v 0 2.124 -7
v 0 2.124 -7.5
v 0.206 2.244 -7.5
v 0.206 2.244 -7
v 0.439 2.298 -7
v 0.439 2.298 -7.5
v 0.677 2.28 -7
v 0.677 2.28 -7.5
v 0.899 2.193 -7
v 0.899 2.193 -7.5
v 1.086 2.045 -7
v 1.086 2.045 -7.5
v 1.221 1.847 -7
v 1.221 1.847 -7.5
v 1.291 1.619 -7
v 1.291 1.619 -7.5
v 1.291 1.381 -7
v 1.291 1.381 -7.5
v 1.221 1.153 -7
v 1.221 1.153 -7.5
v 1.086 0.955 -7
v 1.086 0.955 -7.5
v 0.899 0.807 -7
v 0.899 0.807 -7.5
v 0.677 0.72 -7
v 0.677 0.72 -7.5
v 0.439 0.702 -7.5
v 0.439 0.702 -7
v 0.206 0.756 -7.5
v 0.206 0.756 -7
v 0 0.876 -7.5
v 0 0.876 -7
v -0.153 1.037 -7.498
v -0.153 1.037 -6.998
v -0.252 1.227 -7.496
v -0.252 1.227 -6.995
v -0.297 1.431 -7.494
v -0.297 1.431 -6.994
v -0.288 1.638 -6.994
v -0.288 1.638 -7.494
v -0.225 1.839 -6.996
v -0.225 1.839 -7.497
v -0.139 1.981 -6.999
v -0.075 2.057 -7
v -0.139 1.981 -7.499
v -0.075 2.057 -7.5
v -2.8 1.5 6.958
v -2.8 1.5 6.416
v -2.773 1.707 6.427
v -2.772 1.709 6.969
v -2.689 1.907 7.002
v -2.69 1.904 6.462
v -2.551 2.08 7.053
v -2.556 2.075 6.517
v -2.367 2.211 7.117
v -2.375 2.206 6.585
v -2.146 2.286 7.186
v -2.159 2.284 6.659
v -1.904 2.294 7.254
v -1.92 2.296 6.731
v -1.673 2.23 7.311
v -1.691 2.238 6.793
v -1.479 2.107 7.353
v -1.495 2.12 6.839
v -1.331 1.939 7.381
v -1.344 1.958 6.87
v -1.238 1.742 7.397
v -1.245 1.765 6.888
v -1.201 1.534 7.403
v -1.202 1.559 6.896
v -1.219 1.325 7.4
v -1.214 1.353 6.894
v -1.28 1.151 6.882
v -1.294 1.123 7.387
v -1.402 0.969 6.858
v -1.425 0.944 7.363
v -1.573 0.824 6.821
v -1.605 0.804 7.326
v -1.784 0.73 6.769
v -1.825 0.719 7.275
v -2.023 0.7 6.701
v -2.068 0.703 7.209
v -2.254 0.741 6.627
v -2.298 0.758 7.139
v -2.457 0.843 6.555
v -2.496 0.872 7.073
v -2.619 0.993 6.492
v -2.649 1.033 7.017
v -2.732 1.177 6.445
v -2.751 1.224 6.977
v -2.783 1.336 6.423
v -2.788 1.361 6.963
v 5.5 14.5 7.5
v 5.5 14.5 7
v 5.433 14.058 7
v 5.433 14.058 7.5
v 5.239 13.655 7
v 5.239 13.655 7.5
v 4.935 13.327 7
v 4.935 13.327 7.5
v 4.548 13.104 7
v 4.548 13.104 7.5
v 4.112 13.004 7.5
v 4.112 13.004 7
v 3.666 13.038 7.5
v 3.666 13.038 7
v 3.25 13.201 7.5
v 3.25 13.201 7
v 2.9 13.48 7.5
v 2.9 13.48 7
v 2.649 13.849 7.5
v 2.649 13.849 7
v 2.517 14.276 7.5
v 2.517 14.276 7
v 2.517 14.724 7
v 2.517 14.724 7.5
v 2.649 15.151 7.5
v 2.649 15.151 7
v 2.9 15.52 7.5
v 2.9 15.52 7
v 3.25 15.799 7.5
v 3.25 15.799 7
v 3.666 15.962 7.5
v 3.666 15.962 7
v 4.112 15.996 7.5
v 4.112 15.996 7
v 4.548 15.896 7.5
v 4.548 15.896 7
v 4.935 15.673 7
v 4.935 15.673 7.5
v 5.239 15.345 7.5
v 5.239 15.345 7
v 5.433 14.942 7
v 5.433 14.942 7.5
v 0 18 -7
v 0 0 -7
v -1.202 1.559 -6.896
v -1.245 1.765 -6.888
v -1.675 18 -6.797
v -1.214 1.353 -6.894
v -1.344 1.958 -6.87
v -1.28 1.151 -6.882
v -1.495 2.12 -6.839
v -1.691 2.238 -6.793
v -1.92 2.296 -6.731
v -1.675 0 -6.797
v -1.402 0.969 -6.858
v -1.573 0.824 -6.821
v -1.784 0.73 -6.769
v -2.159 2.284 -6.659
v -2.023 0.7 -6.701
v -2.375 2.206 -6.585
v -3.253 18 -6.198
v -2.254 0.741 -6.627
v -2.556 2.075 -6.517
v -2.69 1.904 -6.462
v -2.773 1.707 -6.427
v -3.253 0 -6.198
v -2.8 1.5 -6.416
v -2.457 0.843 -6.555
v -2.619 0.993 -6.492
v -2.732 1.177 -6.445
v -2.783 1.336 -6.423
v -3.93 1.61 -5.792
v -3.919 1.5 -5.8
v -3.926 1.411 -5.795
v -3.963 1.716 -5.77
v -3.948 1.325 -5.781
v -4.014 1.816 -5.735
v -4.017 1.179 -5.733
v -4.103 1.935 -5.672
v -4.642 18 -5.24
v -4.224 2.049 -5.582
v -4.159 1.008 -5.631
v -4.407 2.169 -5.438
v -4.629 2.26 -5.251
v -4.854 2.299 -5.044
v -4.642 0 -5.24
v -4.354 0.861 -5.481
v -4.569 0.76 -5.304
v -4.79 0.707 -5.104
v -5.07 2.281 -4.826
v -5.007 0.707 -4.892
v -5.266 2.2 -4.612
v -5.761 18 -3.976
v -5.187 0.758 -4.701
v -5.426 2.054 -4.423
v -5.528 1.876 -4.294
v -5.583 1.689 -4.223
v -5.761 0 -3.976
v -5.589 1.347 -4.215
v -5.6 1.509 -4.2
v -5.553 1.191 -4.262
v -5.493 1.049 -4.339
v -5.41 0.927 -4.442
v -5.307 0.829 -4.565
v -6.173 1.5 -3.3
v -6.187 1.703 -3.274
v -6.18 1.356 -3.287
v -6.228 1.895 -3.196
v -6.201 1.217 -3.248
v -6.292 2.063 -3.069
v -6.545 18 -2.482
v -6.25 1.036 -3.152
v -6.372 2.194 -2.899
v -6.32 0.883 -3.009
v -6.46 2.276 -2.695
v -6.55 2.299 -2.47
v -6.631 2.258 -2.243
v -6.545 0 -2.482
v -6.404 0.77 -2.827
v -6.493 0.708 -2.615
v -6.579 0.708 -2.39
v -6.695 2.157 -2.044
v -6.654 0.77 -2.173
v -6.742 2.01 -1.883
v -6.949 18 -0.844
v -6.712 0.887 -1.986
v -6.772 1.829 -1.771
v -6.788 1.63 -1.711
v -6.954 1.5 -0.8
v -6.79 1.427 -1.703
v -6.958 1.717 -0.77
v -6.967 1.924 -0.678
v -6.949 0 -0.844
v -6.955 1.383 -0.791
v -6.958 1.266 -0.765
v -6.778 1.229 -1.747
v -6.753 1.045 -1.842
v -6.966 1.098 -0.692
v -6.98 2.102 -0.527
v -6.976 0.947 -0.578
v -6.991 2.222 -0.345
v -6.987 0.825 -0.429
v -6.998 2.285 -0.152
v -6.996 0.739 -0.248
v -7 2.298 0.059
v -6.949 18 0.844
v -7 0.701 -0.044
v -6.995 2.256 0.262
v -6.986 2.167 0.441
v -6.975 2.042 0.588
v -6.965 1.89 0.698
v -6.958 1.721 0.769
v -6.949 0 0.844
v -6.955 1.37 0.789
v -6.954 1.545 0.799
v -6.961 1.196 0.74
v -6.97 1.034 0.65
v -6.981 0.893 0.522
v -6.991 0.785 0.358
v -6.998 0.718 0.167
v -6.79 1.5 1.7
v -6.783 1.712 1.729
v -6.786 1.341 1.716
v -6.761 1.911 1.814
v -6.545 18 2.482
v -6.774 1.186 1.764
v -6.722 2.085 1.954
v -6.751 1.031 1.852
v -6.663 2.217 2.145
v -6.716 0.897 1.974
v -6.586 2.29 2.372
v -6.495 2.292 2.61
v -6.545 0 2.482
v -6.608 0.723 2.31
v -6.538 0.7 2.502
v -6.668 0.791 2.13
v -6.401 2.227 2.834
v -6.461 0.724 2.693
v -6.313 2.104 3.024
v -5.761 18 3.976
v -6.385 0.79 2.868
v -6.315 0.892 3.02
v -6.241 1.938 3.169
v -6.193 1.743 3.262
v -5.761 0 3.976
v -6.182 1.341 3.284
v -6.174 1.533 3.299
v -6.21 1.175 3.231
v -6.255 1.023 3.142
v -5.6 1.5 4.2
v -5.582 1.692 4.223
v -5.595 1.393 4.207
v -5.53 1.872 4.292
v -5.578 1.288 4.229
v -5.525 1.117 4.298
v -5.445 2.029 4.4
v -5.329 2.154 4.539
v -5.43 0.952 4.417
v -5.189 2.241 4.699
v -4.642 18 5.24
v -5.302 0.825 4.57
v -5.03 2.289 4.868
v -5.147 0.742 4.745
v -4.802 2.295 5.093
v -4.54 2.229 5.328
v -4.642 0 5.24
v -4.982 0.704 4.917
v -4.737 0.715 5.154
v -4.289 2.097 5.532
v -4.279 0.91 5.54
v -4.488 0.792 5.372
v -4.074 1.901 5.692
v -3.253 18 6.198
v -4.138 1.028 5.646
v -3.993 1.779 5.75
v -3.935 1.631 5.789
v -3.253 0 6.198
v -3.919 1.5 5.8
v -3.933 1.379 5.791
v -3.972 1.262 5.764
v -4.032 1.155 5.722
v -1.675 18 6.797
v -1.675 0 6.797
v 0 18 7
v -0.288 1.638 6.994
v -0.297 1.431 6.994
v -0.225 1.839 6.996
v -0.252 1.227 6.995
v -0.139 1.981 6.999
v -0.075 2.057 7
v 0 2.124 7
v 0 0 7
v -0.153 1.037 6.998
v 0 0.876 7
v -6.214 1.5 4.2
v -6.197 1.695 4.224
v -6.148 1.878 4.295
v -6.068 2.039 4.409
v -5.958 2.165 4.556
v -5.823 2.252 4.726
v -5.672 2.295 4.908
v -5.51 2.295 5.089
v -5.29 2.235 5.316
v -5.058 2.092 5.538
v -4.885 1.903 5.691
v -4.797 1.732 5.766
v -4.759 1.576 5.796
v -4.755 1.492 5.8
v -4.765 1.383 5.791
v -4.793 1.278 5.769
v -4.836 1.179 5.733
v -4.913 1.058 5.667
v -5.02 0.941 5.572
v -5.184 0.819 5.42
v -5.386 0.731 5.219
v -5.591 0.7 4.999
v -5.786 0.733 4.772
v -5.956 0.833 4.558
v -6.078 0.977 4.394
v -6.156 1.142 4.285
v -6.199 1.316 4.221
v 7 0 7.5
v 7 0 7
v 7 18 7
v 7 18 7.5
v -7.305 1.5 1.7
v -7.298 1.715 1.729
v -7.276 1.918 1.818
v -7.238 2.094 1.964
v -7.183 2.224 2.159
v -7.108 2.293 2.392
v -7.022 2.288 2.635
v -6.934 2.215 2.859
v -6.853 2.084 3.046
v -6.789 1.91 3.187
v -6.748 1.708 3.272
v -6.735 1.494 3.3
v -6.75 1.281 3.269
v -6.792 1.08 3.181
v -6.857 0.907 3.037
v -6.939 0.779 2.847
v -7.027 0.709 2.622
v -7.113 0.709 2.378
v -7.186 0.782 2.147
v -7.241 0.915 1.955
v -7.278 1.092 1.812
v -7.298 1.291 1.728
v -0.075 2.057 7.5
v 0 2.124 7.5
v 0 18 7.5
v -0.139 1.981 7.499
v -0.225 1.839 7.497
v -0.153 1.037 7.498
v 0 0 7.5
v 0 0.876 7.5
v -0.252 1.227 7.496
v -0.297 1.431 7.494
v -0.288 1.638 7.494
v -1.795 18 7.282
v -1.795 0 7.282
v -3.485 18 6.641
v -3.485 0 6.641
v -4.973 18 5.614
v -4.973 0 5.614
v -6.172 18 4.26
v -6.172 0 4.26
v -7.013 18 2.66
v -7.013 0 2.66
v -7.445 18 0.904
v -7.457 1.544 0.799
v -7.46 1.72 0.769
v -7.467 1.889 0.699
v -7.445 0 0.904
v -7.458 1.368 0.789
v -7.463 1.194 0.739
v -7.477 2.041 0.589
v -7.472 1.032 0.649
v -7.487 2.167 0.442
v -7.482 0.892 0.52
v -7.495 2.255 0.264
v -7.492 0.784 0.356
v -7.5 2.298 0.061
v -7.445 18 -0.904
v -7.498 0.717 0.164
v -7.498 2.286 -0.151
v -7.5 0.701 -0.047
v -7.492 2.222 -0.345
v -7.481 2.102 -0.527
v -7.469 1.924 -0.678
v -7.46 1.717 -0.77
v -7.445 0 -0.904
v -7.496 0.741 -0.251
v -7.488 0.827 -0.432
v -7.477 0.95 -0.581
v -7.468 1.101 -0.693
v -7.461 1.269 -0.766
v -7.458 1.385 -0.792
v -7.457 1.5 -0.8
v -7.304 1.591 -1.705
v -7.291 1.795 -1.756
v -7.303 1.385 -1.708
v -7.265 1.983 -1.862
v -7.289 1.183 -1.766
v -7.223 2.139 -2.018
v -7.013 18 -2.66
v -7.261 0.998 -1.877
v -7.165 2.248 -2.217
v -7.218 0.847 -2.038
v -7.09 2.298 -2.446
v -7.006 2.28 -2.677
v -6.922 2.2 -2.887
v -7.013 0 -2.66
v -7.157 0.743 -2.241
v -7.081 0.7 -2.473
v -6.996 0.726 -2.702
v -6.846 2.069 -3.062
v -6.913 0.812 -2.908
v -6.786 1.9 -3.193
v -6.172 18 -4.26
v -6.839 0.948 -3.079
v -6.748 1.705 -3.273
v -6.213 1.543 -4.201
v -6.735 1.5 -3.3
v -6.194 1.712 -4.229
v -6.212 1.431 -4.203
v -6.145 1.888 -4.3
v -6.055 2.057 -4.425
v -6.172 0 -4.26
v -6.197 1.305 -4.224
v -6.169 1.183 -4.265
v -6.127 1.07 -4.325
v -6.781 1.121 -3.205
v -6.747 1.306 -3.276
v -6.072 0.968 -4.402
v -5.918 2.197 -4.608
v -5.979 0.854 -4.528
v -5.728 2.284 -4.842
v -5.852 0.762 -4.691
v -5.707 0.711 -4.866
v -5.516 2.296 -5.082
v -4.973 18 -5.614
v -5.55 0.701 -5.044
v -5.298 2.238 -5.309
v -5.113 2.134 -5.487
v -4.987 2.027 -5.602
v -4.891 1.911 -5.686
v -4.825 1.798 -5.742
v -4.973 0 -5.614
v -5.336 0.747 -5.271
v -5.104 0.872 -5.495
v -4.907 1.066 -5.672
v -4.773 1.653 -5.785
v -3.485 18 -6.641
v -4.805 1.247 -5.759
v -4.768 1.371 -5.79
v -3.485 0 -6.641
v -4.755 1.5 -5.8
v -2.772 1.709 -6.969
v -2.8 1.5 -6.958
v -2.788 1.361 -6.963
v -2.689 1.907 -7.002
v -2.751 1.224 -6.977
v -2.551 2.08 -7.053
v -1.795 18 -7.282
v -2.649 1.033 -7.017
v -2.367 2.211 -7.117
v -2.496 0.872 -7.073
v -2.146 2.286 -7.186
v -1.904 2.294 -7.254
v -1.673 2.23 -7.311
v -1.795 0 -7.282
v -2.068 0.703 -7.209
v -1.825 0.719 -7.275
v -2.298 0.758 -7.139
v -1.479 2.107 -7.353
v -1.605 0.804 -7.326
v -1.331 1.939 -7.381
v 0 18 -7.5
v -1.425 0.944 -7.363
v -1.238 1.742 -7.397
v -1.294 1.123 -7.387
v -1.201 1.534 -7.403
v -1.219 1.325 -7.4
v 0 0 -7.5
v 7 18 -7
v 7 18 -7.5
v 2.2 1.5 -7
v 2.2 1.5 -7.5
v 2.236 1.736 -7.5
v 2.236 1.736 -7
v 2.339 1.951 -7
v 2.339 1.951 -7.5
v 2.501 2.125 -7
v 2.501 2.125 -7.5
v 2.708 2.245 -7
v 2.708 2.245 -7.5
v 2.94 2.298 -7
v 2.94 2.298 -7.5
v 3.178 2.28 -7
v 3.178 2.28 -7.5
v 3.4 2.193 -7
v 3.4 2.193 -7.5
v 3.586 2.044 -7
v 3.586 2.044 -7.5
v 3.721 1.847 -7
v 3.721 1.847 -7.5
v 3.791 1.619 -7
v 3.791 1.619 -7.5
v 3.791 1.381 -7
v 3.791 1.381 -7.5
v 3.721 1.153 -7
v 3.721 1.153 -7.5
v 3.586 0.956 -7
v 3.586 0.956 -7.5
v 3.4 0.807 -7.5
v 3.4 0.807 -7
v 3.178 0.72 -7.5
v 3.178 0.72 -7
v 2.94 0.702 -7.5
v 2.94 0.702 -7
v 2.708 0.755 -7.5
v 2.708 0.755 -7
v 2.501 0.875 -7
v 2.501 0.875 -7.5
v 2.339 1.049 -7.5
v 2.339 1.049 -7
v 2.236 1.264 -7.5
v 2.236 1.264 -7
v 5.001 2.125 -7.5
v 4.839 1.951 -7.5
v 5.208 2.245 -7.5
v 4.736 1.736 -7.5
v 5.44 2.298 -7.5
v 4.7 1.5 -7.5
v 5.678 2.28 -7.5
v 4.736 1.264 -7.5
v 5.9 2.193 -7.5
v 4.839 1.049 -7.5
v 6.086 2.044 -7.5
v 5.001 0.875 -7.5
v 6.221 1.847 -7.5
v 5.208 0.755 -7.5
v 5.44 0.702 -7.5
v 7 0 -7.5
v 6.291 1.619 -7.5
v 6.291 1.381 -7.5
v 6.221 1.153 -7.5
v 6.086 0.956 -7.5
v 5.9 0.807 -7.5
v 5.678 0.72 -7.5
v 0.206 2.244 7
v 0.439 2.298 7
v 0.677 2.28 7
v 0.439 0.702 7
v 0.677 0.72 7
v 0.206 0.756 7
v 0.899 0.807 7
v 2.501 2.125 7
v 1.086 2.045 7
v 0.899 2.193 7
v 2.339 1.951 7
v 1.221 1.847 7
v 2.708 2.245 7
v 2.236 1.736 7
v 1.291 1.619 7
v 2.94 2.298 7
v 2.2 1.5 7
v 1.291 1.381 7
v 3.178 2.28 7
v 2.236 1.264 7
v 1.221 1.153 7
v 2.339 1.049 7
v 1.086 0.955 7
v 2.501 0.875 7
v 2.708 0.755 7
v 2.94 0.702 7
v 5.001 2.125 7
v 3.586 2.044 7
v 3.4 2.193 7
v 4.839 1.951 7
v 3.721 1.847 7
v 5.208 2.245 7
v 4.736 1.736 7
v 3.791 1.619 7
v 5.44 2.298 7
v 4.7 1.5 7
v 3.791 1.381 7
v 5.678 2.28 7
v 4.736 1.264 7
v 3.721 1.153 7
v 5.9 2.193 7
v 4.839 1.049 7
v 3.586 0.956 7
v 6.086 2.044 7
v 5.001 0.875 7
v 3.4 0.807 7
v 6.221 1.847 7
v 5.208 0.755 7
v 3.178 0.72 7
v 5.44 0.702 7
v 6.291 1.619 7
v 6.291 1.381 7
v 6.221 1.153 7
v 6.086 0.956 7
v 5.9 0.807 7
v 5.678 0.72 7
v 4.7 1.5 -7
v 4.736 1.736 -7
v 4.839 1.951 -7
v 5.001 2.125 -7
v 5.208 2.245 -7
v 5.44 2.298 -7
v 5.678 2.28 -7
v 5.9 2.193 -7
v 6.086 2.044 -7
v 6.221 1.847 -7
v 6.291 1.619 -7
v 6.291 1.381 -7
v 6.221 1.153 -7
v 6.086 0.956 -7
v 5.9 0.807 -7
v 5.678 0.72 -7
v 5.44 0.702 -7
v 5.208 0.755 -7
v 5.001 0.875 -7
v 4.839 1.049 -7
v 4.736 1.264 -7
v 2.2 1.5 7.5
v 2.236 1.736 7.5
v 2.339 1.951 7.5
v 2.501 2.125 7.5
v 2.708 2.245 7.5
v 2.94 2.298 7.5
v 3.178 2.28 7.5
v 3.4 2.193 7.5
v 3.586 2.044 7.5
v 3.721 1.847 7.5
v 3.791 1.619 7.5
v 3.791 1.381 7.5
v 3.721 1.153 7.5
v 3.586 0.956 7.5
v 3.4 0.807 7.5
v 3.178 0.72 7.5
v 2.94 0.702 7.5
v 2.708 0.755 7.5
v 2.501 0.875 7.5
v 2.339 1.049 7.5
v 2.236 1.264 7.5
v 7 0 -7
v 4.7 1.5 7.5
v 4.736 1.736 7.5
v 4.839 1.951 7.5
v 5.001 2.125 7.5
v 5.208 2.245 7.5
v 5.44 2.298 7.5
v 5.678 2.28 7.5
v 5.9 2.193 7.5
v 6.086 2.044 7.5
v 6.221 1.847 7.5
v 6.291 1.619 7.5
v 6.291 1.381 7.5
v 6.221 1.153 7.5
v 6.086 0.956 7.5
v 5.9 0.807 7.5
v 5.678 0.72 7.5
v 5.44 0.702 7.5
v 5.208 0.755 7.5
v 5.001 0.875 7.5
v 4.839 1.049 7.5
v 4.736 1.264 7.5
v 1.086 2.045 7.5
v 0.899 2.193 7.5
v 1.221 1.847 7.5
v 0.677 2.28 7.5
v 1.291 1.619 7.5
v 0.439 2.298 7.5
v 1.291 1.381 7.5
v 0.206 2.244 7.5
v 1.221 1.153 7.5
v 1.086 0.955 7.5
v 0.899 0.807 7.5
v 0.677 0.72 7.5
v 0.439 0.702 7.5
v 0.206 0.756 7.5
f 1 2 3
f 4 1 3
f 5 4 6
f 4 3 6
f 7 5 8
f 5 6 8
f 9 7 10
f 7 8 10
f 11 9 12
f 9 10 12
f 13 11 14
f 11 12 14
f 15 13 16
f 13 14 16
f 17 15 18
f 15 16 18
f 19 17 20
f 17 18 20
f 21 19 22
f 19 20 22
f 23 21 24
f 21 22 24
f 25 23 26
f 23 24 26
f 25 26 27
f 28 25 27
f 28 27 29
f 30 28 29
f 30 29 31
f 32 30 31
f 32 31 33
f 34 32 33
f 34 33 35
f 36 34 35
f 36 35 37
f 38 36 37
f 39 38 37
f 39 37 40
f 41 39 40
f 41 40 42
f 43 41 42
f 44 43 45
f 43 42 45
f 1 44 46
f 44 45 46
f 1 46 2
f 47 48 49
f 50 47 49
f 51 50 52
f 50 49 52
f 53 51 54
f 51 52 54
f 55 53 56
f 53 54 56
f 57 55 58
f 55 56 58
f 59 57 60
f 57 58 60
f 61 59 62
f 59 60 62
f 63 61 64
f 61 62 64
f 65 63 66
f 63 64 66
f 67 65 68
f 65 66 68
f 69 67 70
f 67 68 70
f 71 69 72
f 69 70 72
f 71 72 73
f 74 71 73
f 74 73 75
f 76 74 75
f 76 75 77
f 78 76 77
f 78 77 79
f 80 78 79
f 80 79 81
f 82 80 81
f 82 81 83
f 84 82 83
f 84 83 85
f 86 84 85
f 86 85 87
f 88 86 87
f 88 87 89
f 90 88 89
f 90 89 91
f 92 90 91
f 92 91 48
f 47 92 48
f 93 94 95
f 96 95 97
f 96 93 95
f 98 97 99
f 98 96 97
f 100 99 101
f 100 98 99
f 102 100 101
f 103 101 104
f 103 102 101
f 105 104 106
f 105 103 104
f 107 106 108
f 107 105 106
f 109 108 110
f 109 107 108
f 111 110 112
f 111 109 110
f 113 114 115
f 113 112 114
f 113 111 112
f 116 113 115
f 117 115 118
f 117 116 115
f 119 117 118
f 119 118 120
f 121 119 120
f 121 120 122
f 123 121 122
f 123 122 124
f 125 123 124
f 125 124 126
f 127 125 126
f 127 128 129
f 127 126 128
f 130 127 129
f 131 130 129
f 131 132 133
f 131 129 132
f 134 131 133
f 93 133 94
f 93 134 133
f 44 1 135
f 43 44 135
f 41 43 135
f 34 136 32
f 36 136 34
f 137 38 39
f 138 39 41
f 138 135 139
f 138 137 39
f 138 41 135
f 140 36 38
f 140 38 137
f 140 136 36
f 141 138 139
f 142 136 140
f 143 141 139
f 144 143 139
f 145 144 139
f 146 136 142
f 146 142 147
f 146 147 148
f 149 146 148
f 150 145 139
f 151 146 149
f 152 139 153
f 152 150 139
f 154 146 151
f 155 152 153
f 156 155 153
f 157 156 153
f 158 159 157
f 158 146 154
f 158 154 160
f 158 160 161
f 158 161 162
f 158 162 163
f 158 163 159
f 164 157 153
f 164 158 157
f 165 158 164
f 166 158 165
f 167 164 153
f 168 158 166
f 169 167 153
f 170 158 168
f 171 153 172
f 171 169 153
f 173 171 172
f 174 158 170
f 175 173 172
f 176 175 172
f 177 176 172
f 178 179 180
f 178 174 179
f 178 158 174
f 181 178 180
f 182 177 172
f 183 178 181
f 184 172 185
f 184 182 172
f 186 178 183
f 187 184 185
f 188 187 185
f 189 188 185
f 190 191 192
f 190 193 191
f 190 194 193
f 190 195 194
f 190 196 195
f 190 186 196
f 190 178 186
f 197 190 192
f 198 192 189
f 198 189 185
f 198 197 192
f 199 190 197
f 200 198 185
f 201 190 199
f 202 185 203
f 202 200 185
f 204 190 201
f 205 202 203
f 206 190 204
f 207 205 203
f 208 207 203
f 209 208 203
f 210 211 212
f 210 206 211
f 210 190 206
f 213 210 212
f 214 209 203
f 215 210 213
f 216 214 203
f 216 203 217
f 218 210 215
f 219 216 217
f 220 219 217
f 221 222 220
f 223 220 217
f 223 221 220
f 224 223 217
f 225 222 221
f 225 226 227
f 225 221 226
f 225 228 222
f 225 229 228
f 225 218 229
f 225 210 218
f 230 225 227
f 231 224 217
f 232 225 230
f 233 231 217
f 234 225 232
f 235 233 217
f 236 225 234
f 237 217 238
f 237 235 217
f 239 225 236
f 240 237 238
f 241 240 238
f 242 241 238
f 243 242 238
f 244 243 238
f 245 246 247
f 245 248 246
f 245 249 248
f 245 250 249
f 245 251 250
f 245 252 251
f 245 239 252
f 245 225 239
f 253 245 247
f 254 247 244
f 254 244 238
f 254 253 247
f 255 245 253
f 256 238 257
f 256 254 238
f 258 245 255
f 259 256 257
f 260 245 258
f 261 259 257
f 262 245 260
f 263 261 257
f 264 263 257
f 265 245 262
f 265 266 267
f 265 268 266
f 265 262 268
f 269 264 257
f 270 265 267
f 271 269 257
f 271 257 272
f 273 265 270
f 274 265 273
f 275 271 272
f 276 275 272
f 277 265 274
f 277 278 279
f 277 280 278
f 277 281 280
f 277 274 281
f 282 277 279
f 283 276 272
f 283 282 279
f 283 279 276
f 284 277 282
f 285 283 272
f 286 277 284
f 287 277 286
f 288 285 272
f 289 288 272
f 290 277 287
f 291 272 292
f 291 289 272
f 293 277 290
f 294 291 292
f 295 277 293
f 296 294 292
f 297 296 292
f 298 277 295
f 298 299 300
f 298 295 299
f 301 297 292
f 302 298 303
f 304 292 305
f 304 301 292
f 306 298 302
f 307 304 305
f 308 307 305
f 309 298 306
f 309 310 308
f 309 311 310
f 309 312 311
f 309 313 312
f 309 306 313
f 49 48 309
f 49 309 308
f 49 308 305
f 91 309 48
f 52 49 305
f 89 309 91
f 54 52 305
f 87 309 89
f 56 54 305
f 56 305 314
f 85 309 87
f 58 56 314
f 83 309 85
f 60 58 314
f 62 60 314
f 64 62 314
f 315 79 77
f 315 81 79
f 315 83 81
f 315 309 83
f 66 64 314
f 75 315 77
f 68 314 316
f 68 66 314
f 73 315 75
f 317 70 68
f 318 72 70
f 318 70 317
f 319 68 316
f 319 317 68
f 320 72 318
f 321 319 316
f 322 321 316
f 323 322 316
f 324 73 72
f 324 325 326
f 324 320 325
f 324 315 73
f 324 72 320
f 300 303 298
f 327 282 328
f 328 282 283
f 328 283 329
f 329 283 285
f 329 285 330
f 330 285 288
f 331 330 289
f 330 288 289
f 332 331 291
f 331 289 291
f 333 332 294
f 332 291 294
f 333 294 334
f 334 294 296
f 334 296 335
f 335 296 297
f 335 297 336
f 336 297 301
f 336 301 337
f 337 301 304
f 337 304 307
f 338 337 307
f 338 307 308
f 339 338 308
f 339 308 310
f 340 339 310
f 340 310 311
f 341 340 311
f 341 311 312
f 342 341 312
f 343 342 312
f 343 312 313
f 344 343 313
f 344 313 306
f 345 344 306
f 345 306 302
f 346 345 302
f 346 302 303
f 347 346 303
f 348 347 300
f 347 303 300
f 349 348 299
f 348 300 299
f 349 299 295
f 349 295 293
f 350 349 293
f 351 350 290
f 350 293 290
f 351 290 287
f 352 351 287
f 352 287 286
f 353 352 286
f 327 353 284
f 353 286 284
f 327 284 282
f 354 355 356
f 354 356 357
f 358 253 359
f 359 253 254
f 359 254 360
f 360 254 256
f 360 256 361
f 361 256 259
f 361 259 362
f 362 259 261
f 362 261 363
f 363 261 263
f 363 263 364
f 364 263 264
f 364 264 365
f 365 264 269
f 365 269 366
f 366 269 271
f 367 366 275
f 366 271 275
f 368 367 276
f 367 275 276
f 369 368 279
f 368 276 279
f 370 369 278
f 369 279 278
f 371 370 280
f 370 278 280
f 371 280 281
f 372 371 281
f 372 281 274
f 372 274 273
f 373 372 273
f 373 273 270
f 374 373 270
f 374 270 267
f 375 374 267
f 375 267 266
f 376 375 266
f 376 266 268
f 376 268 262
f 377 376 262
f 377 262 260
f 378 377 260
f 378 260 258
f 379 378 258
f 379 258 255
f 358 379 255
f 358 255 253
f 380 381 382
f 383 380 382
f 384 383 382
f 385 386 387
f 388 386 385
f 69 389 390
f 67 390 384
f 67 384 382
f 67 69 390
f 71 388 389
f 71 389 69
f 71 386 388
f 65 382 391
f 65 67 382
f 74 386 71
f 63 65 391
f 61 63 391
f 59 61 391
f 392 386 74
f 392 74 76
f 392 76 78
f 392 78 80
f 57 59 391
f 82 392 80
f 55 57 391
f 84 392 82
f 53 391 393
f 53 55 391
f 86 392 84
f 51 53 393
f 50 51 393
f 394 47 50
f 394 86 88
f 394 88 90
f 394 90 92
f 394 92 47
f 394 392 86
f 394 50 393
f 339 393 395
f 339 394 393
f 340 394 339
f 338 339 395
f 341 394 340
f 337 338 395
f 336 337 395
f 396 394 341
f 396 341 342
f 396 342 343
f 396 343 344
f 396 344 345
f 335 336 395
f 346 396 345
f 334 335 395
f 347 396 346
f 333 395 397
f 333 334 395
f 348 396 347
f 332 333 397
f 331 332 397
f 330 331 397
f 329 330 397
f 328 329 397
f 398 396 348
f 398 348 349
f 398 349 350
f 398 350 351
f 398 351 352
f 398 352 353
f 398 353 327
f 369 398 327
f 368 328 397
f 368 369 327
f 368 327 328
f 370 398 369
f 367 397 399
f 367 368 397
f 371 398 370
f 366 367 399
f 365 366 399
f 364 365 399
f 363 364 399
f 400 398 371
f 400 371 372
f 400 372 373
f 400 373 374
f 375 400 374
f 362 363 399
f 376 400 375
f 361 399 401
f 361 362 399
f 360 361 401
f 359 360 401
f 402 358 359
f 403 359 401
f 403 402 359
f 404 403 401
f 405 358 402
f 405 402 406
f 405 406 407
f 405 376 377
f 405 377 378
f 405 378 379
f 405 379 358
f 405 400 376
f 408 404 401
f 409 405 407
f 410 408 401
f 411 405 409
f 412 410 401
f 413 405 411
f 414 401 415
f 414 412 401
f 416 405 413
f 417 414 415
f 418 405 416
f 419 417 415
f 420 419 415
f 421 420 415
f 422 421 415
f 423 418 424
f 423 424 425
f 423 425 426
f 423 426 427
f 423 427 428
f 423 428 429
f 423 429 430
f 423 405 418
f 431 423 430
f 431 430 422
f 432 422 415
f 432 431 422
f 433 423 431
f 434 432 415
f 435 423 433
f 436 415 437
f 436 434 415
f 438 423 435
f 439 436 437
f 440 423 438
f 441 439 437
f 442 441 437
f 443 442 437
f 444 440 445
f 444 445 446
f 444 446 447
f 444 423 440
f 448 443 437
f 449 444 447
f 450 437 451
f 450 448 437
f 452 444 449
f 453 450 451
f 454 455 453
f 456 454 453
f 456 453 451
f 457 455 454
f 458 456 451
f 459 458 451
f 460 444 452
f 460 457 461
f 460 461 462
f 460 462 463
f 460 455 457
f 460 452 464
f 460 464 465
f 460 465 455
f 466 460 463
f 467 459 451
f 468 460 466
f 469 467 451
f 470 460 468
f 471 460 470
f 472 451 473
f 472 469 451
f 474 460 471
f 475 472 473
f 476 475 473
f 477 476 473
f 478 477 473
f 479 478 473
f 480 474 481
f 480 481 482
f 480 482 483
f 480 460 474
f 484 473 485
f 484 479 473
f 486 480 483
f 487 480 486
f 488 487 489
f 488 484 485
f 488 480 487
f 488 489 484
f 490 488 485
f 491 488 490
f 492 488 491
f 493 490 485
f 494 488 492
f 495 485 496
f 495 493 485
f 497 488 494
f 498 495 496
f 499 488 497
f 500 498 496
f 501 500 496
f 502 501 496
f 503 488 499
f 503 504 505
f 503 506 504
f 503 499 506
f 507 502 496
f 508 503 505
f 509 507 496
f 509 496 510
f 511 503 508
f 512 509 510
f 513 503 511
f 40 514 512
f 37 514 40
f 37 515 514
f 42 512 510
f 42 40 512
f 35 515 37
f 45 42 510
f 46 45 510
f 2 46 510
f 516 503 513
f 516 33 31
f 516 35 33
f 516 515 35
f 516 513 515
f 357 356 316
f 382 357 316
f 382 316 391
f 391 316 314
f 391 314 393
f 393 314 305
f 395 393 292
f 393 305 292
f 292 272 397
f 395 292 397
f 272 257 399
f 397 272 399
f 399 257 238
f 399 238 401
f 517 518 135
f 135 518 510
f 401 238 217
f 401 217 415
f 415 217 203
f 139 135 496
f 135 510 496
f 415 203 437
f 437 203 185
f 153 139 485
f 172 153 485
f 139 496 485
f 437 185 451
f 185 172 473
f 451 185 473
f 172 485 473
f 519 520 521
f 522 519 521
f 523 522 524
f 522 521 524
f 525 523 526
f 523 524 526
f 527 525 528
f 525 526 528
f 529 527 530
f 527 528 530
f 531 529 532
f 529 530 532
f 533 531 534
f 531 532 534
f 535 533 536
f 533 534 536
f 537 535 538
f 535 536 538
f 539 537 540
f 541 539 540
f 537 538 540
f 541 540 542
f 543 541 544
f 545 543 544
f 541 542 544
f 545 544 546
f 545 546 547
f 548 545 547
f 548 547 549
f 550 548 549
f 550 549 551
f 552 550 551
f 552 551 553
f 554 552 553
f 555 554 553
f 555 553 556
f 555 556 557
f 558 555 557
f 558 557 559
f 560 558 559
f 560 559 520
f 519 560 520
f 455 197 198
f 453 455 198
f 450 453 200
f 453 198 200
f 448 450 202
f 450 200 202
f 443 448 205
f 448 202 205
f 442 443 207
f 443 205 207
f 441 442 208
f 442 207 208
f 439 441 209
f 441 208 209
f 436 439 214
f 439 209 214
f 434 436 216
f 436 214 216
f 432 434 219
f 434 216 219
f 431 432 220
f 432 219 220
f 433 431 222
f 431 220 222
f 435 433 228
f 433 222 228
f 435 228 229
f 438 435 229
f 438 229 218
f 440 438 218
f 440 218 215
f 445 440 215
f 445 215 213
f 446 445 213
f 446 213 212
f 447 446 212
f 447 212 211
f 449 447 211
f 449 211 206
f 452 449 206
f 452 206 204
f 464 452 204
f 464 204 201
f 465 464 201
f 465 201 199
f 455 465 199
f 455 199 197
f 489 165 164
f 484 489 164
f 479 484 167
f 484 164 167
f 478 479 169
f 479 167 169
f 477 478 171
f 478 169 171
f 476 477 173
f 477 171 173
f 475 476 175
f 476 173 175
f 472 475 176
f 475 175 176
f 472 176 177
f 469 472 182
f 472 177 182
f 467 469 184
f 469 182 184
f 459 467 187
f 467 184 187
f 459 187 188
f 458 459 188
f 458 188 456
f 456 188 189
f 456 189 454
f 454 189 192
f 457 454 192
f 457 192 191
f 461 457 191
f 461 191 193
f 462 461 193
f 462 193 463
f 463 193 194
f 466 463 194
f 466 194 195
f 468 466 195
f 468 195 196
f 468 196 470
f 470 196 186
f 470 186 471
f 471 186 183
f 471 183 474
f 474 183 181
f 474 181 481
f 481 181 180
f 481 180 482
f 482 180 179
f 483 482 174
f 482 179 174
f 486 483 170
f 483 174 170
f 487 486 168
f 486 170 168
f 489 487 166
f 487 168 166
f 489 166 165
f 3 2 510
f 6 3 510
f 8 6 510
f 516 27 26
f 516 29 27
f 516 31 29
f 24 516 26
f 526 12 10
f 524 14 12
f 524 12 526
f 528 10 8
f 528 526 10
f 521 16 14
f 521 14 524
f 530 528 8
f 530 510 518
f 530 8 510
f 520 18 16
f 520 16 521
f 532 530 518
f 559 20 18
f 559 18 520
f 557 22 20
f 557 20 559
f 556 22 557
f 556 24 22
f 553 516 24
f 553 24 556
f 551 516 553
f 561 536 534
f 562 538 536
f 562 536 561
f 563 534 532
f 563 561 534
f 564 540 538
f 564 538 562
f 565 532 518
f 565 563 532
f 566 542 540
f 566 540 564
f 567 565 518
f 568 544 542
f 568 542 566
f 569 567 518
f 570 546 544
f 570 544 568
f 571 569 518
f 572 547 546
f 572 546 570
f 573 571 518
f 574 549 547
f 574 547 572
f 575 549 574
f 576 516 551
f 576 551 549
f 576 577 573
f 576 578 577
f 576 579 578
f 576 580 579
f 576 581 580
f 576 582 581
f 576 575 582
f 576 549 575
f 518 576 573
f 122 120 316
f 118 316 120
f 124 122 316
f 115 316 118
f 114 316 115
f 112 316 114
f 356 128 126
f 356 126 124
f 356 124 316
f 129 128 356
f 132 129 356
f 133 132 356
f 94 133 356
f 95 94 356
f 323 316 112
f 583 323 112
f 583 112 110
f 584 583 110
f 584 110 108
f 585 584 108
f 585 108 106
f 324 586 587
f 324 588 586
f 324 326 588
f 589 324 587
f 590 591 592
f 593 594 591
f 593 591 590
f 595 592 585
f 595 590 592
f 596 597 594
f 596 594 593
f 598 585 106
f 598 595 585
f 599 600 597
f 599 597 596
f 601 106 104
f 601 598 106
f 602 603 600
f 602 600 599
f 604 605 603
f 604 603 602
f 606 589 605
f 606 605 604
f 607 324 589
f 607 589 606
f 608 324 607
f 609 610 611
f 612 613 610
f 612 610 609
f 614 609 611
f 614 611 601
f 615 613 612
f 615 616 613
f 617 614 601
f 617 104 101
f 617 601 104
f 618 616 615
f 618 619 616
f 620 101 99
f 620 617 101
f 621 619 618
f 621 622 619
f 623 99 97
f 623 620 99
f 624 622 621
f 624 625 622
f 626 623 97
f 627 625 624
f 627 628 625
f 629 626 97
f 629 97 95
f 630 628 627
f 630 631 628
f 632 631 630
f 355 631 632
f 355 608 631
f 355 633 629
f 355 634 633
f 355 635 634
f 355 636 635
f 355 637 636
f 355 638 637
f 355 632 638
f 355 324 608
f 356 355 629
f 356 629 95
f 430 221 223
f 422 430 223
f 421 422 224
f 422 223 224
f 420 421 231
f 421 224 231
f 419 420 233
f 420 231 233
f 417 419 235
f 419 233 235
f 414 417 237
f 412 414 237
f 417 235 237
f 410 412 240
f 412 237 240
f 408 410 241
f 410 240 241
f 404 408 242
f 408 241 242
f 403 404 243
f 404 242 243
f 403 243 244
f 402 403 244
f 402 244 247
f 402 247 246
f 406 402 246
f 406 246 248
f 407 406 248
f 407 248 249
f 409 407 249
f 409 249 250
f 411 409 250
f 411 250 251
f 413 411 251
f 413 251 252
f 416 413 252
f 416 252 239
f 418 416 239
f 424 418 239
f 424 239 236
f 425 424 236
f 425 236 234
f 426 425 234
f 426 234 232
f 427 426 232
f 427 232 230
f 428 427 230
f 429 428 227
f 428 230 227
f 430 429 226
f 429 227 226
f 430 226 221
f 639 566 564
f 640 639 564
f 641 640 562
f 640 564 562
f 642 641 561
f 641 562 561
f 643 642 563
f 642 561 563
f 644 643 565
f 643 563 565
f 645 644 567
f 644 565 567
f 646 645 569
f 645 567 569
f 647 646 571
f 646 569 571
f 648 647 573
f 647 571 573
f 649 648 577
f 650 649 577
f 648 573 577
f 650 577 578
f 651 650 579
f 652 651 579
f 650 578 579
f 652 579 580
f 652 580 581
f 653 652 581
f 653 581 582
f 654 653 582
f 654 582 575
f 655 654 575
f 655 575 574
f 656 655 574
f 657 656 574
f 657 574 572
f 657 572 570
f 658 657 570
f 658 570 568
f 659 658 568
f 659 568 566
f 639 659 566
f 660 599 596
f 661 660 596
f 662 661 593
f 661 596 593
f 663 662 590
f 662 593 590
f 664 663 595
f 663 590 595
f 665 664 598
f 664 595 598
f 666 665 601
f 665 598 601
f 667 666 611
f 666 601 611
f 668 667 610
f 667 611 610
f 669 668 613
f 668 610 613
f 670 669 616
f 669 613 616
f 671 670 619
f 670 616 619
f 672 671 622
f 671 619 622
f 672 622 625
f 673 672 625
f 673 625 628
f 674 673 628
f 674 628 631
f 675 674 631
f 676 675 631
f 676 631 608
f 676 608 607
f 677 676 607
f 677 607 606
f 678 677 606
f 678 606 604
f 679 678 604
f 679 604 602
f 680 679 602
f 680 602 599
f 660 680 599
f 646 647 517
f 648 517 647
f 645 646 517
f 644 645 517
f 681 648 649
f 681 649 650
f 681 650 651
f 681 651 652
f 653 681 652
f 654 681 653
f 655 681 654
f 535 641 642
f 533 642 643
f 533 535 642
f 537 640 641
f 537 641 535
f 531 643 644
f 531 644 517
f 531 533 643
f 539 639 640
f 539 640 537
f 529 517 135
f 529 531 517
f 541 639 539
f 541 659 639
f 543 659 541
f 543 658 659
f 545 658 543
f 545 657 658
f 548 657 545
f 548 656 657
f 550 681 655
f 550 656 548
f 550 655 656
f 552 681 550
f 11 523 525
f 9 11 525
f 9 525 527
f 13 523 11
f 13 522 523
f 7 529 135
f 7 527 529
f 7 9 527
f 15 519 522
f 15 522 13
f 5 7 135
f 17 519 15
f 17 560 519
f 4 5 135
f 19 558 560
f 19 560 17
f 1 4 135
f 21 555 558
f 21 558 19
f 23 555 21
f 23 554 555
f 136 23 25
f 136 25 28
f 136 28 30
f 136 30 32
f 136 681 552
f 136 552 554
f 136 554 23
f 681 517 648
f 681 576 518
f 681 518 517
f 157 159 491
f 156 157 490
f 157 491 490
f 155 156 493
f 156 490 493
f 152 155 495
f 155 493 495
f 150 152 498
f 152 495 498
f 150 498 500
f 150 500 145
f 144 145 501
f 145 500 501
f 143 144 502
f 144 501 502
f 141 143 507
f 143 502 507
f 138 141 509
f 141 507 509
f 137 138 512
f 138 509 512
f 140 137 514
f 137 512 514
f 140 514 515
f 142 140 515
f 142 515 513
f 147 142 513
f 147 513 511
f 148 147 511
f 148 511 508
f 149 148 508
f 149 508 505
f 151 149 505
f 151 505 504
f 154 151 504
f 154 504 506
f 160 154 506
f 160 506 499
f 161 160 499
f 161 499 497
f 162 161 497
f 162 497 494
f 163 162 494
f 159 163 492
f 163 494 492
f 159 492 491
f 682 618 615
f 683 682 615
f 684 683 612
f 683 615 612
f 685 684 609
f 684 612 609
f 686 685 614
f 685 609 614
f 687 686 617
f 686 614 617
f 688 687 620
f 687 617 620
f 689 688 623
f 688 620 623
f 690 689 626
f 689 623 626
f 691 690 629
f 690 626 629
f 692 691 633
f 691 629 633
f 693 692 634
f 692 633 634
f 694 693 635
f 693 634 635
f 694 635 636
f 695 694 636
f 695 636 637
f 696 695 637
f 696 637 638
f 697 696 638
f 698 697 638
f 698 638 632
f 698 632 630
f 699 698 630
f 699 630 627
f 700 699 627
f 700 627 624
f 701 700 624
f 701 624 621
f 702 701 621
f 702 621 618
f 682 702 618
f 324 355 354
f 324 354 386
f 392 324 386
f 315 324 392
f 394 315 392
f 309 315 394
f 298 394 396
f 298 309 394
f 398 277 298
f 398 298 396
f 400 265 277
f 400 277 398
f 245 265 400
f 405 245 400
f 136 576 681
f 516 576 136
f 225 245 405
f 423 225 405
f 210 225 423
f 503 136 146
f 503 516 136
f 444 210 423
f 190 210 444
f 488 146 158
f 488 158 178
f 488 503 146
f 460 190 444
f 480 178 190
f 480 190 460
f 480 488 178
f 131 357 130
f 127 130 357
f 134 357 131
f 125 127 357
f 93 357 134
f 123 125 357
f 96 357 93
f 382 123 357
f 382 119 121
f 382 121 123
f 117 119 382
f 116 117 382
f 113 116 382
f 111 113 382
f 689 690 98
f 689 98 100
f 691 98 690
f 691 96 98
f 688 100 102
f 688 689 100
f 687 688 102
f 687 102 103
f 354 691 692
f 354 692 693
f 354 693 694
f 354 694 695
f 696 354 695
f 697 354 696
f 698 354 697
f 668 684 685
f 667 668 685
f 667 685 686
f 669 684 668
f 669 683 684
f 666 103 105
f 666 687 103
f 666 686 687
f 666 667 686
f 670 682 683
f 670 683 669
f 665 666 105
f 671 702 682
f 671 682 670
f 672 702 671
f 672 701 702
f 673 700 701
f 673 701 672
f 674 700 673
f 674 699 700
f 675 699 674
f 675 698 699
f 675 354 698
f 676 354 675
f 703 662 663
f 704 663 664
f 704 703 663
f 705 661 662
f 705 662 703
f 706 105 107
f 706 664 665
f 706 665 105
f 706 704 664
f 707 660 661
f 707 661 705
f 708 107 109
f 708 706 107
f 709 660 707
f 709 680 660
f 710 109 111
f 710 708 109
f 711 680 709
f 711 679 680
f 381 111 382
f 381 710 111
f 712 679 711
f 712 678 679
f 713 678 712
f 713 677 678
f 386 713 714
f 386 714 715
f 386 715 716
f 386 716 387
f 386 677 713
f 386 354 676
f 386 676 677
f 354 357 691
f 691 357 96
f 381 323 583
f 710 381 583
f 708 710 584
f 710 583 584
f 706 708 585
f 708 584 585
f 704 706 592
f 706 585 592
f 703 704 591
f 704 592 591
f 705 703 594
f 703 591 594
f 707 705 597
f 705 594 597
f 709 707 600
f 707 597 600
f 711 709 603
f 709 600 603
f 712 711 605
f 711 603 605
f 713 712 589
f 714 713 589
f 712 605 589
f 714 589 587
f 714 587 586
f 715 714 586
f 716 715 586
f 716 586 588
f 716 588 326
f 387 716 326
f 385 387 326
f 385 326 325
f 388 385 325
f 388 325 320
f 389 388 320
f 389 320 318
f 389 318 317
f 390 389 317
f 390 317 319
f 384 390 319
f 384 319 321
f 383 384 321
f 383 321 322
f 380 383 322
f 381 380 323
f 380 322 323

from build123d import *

# Parameters (mm, degrees)
BOSS_EXTRUDE1_DEPTH = 18
SKETCH2_R           = 1.5
CUT_EXTRUDE1_DEPTH  = 2
SKETCH3_R           = 0.8
CUT_EXTRUDE2_DEPTH  = 25.6018292
SKETCH4_R           = 0.8
CUT_EXTRUDE3_DEPTH  = 21.892582574


with BuildPart() as part:
    # Sketch1 → Boss-Extrude1 (new body)
    with BuildSketch(Plane(origin=(0, 0, 0), x_dir=(1, 0, 0), z_dir=(0, 1, 0))):
        with BuildLine():
            Line((0, 7.5), (7, 7.5))
            Line((7, 7.5), (7, 7))
            Line((7, 7), (0, 7))
            ThreePointArc((0, 7), (-7, 0), (0, -7))
            Line((0, -7), (7, -7))
            Line((7, -7), (7, -7.5))
            Line((7, -7.5), (0, -7.5))
            ThreePointArc((0, -7.5), (-7.5, 0), (0, 7.5))
        make_face()
    extrude(amount=BOSS_EXTRUDE1_DEPTH)

    # Sketch2 → Cut-Extrude1 (cut)
    with BuildSketch(Plane(origin=(0, 0, 7.5), x_dir=(-1, 0, 0), z_dir=(0, 0, -1))):
        with Locations(Location((-4, 14.5, 0), (0, 0, 180))):
            Circle(SKETCH2_R)
    extrude(amount=CUT_EXTRUDE1_DEPTH, mode=Mode.SUBTRACT)

    # Sketch3 → Cut-Extrude2 (cut, through all)
    with BuildSketch(Plane(origin=(0, 0, -7.5), x_dir=(-1, 0, 0), z_dir=(0, 0, -1))):
        with Locations((-5.5, 1.5)):
            Circle(SKETCH3_R)
        with Locations((-3, 1.5)):
            Circle(SKETCH3_R)
        with Locations(Location((-0.5, 1.5, 0), (0, 0, 51.317812547))):
            Circle(SKETCH3_R)
        with Locations((2, 1.5)):
            Circle(SKETCH3_R)
    extrude(amount=-CUT_EXTRUDE2_DEPTH, mode=Mode.SUBTRACT)

    # Sketch4 → Cut-Extrude3 (cut, through all)
    with BuildSketch(Plane(origin=(0, 0, 0), x_dir=(0, 0, -1), z_dir=(1, 0, 0))):
        with Locations((0, 1.5)):
            Circle(SKETCH4_R)
        with Locations((2.5, 1.5)):
            Circle(SKETCH4_R)
        with Locations((5, 1.5)):
            Circle(SKETCH4_R)
        with Locations((-2.5, 1.5)):
            Circle(SKETCH4_R)
        with Locations((-5, 1.5)):
            Circle(SKETCH4_R)
    extrude(amount=-CUT_EXTRUDE3_DEPTH, mode=Mode.SUBTRACT)


solid = part.part
